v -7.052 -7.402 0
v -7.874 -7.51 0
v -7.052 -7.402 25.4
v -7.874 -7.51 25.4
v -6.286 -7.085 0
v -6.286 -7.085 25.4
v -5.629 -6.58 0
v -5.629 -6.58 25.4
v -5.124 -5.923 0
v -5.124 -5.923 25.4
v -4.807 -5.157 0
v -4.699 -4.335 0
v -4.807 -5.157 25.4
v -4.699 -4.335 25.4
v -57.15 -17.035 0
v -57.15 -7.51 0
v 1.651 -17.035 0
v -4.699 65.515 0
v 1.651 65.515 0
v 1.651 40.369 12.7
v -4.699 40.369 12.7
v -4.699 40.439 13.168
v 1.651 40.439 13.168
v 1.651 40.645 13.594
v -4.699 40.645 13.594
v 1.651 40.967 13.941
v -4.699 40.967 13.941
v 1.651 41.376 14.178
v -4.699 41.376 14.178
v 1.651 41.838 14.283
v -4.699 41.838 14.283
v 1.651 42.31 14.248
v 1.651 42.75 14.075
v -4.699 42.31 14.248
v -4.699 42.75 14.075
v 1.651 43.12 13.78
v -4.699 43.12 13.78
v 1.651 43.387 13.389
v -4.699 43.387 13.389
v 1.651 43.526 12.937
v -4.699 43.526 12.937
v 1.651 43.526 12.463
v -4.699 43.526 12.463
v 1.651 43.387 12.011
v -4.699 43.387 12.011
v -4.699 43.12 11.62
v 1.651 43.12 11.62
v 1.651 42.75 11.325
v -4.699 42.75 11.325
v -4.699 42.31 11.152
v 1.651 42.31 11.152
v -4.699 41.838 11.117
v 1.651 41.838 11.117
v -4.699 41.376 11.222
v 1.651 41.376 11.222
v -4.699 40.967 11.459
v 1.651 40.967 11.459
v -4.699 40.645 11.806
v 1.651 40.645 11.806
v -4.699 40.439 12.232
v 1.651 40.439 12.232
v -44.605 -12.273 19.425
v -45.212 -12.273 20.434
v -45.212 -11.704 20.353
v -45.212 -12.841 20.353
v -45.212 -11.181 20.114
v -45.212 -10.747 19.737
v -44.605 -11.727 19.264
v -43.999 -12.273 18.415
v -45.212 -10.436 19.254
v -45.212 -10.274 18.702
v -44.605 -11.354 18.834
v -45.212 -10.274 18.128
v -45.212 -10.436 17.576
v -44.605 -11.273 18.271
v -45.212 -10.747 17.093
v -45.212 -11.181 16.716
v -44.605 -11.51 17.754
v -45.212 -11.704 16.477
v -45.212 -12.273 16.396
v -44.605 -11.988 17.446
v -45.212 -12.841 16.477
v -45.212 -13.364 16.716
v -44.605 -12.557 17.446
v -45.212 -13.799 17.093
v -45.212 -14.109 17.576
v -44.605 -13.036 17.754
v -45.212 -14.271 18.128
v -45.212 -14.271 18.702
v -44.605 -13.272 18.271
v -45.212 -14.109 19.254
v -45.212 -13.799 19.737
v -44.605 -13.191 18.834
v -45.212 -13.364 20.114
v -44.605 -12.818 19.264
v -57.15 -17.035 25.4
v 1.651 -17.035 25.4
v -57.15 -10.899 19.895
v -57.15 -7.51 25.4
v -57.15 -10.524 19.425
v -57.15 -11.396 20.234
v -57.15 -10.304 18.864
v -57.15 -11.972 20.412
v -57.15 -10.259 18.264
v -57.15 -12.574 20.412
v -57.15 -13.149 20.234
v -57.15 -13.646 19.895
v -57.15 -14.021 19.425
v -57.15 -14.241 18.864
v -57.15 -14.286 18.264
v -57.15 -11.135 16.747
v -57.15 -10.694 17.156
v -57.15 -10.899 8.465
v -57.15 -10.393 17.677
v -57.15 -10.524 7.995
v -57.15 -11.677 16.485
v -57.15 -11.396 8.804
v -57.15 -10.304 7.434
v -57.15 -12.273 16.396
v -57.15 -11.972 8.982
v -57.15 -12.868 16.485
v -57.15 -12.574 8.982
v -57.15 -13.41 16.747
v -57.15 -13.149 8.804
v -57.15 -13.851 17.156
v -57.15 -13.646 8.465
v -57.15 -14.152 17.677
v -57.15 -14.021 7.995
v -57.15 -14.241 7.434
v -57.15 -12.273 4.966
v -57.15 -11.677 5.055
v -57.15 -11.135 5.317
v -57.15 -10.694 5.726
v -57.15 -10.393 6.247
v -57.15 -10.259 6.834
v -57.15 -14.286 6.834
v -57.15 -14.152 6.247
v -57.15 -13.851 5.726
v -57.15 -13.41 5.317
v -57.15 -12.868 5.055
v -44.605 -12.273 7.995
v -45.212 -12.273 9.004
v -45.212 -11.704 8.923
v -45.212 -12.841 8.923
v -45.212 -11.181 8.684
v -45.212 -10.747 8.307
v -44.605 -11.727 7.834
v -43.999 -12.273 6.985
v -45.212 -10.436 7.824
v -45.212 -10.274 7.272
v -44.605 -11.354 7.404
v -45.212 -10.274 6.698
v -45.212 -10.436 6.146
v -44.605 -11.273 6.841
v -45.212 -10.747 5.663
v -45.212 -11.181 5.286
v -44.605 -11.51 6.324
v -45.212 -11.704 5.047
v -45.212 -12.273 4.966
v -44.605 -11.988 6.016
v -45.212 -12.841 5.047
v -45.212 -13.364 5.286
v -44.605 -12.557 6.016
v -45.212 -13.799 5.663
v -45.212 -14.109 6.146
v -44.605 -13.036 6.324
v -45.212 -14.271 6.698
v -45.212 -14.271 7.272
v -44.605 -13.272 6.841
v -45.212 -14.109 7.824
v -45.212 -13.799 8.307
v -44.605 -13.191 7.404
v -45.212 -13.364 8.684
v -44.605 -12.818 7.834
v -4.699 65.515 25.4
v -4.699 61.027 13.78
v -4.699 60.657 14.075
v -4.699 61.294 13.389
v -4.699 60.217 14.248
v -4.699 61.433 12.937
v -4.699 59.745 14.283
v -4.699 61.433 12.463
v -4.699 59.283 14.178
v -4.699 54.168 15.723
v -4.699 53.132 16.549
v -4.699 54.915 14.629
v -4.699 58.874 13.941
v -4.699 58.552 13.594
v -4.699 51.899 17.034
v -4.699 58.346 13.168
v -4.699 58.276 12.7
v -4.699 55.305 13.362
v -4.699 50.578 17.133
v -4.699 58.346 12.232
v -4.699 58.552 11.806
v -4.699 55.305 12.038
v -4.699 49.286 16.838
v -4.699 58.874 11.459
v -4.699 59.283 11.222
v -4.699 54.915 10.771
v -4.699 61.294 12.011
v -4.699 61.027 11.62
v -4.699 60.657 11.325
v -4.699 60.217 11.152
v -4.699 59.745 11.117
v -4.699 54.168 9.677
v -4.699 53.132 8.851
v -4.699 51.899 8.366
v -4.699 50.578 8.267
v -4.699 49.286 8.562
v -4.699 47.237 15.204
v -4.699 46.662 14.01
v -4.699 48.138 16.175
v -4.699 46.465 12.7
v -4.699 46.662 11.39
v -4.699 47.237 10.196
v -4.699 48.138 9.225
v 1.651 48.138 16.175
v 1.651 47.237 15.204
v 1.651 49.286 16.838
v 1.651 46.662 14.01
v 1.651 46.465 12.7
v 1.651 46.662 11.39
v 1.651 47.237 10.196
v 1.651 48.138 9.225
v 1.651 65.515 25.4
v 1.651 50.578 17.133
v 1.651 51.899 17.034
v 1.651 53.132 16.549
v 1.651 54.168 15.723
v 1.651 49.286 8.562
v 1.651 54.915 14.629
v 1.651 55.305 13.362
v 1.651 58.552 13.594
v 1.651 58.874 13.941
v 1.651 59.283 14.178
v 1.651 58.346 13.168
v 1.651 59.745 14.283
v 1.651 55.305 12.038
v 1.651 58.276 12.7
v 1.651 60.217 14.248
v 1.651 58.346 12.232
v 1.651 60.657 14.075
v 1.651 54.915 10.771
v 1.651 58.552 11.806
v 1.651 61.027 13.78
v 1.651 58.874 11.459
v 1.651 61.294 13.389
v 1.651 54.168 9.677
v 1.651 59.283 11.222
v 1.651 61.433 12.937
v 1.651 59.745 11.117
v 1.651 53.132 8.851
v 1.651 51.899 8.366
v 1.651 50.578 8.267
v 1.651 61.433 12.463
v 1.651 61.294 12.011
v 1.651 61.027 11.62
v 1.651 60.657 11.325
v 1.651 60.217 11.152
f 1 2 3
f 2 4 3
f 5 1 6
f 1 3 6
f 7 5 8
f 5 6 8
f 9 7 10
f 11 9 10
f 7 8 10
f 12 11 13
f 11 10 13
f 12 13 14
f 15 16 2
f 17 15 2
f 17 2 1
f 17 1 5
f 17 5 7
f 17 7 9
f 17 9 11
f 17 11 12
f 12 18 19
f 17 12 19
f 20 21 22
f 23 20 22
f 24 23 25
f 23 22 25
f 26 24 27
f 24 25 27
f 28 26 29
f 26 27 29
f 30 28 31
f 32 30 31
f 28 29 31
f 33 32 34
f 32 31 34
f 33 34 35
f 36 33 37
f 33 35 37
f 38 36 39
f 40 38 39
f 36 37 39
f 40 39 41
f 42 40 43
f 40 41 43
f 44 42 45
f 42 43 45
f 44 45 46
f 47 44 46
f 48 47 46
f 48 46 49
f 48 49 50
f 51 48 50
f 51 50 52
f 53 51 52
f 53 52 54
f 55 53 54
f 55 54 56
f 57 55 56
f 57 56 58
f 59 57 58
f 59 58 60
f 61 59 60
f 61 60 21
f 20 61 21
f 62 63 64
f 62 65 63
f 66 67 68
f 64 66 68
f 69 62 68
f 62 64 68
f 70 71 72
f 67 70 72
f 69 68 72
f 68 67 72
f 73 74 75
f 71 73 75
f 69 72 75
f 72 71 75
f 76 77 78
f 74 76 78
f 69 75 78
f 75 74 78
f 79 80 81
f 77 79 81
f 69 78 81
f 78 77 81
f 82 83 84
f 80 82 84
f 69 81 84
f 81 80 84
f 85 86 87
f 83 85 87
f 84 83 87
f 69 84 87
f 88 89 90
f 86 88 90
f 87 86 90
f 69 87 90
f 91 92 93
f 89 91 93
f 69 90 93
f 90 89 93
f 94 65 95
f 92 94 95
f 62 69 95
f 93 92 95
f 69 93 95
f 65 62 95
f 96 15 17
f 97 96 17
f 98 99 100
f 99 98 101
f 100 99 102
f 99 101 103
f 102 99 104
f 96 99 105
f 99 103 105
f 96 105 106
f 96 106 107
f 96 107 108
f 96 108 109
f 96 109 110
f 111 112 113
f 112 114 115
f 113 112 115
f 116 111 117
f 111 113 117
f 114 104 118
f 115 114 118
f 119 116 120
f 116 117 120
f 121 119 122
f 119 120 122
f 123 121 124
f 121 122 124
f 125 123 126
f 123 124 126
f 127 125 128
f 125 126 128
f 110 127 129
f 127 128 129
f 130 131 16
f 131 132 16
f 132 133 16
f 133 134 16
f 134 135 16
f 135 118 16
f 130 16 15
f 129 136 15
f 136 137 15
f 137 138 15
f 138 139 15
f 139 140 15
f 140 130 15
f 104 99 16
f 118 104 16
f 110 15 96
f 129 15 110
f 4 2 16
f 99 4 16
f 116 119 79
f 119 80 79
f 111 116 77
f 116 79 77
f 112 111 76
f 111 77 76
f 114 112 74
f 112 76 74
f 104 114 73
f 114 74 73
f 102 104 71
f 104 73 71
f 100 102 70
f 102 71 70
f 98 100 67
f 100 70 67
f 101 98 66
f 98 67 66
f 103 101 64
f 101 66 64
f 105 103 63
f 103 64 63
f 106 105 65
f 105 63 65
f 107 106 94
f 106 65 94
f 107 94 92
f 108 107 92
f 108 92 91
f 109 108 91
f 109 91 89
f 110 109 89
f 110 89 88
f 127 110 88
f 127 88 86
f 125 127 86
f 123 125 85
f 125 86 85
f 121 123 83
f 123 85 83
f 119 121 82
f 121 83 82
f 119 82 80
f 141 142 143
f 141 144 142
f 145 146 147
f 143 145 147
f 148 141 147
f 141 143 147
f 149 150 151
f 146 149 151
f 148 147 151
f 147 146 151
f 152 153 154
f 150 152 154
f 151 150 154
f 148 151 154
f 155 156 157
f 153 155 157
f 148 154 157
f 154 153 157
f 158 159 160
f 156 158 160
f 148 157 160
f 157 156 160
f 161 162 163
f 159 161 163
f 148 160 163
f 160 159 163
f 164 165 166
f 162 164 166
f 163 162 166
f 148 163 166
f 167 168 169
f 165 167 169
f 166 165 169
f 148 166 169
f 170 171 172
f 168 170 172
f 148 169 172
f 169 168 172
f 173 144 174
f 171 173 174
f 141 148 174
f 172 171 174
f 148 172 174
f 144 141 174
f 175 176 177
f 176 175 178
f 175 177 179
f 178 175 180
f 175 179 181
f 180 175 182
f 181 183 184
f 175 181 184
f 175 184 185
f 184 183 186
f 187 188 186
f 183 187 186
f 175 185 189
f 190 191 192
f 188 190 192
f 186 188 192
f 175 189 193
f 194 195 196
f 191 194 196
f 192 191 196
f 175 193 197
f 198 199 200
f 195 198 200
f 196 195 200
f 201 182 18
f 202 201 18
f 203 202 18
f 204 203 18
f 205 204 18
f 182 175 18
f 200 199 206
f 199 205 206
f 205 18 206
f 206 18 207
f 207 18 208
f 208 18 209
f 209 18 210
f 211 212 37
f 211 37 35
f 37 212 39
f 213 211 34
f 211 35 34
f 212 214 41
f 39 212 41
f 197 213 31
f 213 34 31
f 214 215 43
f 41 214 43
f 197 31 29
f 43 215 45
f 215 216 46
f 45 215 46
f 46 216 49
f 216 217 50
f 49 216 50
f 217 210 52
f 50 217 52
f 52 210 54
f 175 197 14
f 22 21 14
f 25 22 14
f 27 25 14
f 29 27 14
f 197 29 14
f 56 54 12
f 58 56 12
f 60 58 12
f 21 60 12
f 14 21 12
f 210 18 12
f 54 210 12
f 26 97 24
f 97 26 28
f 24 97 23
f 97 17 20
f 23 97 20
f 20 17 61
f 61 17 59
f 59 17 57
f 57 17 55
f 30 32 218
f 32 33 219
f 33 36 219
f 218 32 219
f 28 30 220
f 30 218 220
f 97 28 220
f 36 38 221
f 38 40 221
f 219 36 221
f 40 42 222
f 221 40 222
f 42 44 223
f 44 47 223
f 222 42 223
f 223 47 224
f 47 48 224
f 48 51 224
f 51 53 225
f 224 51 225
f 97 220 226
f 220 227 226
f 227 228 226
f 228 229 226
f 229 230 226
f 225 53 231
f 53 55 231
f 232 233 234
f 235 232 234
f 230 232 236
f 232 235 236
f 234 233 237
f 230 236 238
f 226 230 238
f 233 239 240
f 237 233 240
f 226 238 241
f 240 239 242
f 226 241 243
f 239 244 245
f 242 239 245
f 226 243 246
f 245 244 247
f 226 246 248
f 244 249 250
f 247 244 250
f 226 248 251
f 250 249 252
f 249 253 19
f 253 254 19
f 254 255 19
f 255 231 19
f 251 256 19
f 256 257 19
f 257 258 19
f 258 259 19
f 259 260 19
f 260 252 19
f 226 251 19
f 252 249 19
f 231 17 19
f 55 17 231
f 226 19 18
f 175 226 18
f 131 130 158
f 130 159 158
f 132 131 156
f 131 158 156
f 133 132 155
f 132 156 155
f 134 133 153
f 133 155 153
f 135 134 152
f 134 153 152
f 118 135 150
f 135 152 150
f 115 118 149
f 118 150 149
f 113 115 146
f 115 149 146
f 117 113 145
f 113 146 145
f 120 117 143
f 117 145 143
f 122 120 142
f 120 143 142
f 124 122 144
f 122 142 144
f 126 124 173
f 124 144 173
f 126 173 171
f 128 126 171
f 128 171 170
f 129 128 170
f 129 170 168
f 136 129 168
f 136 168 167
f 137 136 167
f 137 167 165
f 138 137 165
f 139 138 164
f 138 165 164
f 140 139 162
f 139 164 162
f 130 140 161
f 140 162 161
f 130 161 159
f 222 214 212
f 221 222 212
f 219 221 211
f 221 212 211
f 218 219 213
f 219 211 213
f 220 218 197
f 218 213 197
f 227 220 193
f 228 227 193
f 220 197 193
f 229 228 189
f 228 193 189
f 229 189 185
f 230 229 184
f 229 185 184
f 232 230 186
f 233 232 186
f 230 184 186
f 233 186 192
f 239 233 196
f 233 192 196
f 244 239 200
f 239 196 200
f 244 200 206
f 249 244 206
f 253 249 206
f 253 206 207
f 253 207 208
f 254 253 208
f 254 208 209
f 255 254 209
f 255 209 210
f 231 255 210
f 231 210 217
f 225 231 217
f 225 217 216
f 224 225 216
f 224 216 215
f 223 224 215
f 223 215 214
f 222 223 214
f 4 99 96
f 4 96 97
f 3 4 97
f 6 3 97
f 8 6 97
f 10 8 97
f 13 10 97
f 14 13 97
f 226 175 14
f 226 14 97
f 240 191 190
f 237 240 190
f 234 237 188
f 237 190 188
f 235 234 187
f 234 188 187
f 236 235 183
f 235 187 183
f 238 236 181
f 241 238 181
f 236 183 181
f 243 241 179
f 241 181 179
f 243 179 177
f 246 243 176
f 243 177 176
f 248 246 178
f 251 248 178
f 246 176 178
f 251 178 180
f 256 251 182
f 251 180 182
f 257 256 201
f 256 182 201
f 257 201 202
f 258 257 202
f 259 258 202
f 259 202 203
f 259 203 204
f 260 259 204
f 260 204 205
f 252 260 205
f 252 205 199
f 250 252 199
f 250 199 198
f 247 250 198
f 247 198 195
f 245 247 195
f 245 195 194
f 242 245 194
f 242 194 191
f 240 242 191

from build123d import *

# Parameters (mm, degrees)
BOSS_EXTRUDE1_DEPTH        = 25.4
SKETCH2_R                  = 4.445
SKETCH2_R_2                = 1.5875
CUT_EXTRUDE1_DEPTH         = 88.683921143
F_10_32_TAPPED_HOLE1_D     = 4.0386
F_10_32_TAPPED_HOLE1_DEPTH = 11.938
F_10_32_TAPPED_HOLE1_TIP   = 1.213317848
FILLET1_R                  = 3.175


with BuildPart() as part:
    # Sketch1 → Boss-Extrude1 (new body)
    with BuildSketch(Plane.XY):
        Polygon((-57.15, -17.035096154), (1.651, -17.035096154), (1.651, 65.514903846), (-4.699, 65.514903846), (-4.699, -7.510096154), (-57.15, -7.510096154), align=None)
    extrude(amount=BOSS_EXTRUDE1_DEPTH)

    # Sketch2 → Cut-Extrude1 (cut, through all)
    with BuildSketch(Plane.ZY.offset(4.699)):
        with Locations(Location((12.7, 50.909903846, 0), (0, 0, 270))):
            Circle(SKETCH2_R)
        with Locations(Location((12.7, 59.863403846, 0), (0, 0, 270))):
            Circle(SKETCH2_R_2)
        with Locations(Location((12.7, 41.956403846, 0), (0, 0, 270))):
            Circle(SKETCH2_R_2)
    extrude(amount=-CUT_EXTRUDE1_DEPTH, mode=Mode.SUBTRACT)

    # #10-32 Tapped Hole1
    with Locations(Plane.ZY.offset(57.15)):
        with Locations((6.985, -12.272596154), (18.415, -12.272596154)):
            Hole(F_10_32_TAPPED_HOLE1_D / 2, depth=F_10_32_TAPPED_HOLE1_DEPTH)
            with Locations((0, 0, -(F_10_32_TAPPED_HOLE1_DEPTH + F_10_32_TAPPED_HOLE1_TIP / 2))):  # 118° drill point
                Cone(0, F_10_32_TAPPED_HOLE1_D / 2, F_10_32_TAPPED_HOLE1_TIP, mode=Mode.SUBTRACT)

    # Fillet1
    fillet1_edges = [part.edges().sort_by_distance(p)[0] for p in [
        (-4.699, -7.510096154, 12.7),
    ]]
    fillet(fillet1_edges, radius=FILLET1_R)


solid = part.part
